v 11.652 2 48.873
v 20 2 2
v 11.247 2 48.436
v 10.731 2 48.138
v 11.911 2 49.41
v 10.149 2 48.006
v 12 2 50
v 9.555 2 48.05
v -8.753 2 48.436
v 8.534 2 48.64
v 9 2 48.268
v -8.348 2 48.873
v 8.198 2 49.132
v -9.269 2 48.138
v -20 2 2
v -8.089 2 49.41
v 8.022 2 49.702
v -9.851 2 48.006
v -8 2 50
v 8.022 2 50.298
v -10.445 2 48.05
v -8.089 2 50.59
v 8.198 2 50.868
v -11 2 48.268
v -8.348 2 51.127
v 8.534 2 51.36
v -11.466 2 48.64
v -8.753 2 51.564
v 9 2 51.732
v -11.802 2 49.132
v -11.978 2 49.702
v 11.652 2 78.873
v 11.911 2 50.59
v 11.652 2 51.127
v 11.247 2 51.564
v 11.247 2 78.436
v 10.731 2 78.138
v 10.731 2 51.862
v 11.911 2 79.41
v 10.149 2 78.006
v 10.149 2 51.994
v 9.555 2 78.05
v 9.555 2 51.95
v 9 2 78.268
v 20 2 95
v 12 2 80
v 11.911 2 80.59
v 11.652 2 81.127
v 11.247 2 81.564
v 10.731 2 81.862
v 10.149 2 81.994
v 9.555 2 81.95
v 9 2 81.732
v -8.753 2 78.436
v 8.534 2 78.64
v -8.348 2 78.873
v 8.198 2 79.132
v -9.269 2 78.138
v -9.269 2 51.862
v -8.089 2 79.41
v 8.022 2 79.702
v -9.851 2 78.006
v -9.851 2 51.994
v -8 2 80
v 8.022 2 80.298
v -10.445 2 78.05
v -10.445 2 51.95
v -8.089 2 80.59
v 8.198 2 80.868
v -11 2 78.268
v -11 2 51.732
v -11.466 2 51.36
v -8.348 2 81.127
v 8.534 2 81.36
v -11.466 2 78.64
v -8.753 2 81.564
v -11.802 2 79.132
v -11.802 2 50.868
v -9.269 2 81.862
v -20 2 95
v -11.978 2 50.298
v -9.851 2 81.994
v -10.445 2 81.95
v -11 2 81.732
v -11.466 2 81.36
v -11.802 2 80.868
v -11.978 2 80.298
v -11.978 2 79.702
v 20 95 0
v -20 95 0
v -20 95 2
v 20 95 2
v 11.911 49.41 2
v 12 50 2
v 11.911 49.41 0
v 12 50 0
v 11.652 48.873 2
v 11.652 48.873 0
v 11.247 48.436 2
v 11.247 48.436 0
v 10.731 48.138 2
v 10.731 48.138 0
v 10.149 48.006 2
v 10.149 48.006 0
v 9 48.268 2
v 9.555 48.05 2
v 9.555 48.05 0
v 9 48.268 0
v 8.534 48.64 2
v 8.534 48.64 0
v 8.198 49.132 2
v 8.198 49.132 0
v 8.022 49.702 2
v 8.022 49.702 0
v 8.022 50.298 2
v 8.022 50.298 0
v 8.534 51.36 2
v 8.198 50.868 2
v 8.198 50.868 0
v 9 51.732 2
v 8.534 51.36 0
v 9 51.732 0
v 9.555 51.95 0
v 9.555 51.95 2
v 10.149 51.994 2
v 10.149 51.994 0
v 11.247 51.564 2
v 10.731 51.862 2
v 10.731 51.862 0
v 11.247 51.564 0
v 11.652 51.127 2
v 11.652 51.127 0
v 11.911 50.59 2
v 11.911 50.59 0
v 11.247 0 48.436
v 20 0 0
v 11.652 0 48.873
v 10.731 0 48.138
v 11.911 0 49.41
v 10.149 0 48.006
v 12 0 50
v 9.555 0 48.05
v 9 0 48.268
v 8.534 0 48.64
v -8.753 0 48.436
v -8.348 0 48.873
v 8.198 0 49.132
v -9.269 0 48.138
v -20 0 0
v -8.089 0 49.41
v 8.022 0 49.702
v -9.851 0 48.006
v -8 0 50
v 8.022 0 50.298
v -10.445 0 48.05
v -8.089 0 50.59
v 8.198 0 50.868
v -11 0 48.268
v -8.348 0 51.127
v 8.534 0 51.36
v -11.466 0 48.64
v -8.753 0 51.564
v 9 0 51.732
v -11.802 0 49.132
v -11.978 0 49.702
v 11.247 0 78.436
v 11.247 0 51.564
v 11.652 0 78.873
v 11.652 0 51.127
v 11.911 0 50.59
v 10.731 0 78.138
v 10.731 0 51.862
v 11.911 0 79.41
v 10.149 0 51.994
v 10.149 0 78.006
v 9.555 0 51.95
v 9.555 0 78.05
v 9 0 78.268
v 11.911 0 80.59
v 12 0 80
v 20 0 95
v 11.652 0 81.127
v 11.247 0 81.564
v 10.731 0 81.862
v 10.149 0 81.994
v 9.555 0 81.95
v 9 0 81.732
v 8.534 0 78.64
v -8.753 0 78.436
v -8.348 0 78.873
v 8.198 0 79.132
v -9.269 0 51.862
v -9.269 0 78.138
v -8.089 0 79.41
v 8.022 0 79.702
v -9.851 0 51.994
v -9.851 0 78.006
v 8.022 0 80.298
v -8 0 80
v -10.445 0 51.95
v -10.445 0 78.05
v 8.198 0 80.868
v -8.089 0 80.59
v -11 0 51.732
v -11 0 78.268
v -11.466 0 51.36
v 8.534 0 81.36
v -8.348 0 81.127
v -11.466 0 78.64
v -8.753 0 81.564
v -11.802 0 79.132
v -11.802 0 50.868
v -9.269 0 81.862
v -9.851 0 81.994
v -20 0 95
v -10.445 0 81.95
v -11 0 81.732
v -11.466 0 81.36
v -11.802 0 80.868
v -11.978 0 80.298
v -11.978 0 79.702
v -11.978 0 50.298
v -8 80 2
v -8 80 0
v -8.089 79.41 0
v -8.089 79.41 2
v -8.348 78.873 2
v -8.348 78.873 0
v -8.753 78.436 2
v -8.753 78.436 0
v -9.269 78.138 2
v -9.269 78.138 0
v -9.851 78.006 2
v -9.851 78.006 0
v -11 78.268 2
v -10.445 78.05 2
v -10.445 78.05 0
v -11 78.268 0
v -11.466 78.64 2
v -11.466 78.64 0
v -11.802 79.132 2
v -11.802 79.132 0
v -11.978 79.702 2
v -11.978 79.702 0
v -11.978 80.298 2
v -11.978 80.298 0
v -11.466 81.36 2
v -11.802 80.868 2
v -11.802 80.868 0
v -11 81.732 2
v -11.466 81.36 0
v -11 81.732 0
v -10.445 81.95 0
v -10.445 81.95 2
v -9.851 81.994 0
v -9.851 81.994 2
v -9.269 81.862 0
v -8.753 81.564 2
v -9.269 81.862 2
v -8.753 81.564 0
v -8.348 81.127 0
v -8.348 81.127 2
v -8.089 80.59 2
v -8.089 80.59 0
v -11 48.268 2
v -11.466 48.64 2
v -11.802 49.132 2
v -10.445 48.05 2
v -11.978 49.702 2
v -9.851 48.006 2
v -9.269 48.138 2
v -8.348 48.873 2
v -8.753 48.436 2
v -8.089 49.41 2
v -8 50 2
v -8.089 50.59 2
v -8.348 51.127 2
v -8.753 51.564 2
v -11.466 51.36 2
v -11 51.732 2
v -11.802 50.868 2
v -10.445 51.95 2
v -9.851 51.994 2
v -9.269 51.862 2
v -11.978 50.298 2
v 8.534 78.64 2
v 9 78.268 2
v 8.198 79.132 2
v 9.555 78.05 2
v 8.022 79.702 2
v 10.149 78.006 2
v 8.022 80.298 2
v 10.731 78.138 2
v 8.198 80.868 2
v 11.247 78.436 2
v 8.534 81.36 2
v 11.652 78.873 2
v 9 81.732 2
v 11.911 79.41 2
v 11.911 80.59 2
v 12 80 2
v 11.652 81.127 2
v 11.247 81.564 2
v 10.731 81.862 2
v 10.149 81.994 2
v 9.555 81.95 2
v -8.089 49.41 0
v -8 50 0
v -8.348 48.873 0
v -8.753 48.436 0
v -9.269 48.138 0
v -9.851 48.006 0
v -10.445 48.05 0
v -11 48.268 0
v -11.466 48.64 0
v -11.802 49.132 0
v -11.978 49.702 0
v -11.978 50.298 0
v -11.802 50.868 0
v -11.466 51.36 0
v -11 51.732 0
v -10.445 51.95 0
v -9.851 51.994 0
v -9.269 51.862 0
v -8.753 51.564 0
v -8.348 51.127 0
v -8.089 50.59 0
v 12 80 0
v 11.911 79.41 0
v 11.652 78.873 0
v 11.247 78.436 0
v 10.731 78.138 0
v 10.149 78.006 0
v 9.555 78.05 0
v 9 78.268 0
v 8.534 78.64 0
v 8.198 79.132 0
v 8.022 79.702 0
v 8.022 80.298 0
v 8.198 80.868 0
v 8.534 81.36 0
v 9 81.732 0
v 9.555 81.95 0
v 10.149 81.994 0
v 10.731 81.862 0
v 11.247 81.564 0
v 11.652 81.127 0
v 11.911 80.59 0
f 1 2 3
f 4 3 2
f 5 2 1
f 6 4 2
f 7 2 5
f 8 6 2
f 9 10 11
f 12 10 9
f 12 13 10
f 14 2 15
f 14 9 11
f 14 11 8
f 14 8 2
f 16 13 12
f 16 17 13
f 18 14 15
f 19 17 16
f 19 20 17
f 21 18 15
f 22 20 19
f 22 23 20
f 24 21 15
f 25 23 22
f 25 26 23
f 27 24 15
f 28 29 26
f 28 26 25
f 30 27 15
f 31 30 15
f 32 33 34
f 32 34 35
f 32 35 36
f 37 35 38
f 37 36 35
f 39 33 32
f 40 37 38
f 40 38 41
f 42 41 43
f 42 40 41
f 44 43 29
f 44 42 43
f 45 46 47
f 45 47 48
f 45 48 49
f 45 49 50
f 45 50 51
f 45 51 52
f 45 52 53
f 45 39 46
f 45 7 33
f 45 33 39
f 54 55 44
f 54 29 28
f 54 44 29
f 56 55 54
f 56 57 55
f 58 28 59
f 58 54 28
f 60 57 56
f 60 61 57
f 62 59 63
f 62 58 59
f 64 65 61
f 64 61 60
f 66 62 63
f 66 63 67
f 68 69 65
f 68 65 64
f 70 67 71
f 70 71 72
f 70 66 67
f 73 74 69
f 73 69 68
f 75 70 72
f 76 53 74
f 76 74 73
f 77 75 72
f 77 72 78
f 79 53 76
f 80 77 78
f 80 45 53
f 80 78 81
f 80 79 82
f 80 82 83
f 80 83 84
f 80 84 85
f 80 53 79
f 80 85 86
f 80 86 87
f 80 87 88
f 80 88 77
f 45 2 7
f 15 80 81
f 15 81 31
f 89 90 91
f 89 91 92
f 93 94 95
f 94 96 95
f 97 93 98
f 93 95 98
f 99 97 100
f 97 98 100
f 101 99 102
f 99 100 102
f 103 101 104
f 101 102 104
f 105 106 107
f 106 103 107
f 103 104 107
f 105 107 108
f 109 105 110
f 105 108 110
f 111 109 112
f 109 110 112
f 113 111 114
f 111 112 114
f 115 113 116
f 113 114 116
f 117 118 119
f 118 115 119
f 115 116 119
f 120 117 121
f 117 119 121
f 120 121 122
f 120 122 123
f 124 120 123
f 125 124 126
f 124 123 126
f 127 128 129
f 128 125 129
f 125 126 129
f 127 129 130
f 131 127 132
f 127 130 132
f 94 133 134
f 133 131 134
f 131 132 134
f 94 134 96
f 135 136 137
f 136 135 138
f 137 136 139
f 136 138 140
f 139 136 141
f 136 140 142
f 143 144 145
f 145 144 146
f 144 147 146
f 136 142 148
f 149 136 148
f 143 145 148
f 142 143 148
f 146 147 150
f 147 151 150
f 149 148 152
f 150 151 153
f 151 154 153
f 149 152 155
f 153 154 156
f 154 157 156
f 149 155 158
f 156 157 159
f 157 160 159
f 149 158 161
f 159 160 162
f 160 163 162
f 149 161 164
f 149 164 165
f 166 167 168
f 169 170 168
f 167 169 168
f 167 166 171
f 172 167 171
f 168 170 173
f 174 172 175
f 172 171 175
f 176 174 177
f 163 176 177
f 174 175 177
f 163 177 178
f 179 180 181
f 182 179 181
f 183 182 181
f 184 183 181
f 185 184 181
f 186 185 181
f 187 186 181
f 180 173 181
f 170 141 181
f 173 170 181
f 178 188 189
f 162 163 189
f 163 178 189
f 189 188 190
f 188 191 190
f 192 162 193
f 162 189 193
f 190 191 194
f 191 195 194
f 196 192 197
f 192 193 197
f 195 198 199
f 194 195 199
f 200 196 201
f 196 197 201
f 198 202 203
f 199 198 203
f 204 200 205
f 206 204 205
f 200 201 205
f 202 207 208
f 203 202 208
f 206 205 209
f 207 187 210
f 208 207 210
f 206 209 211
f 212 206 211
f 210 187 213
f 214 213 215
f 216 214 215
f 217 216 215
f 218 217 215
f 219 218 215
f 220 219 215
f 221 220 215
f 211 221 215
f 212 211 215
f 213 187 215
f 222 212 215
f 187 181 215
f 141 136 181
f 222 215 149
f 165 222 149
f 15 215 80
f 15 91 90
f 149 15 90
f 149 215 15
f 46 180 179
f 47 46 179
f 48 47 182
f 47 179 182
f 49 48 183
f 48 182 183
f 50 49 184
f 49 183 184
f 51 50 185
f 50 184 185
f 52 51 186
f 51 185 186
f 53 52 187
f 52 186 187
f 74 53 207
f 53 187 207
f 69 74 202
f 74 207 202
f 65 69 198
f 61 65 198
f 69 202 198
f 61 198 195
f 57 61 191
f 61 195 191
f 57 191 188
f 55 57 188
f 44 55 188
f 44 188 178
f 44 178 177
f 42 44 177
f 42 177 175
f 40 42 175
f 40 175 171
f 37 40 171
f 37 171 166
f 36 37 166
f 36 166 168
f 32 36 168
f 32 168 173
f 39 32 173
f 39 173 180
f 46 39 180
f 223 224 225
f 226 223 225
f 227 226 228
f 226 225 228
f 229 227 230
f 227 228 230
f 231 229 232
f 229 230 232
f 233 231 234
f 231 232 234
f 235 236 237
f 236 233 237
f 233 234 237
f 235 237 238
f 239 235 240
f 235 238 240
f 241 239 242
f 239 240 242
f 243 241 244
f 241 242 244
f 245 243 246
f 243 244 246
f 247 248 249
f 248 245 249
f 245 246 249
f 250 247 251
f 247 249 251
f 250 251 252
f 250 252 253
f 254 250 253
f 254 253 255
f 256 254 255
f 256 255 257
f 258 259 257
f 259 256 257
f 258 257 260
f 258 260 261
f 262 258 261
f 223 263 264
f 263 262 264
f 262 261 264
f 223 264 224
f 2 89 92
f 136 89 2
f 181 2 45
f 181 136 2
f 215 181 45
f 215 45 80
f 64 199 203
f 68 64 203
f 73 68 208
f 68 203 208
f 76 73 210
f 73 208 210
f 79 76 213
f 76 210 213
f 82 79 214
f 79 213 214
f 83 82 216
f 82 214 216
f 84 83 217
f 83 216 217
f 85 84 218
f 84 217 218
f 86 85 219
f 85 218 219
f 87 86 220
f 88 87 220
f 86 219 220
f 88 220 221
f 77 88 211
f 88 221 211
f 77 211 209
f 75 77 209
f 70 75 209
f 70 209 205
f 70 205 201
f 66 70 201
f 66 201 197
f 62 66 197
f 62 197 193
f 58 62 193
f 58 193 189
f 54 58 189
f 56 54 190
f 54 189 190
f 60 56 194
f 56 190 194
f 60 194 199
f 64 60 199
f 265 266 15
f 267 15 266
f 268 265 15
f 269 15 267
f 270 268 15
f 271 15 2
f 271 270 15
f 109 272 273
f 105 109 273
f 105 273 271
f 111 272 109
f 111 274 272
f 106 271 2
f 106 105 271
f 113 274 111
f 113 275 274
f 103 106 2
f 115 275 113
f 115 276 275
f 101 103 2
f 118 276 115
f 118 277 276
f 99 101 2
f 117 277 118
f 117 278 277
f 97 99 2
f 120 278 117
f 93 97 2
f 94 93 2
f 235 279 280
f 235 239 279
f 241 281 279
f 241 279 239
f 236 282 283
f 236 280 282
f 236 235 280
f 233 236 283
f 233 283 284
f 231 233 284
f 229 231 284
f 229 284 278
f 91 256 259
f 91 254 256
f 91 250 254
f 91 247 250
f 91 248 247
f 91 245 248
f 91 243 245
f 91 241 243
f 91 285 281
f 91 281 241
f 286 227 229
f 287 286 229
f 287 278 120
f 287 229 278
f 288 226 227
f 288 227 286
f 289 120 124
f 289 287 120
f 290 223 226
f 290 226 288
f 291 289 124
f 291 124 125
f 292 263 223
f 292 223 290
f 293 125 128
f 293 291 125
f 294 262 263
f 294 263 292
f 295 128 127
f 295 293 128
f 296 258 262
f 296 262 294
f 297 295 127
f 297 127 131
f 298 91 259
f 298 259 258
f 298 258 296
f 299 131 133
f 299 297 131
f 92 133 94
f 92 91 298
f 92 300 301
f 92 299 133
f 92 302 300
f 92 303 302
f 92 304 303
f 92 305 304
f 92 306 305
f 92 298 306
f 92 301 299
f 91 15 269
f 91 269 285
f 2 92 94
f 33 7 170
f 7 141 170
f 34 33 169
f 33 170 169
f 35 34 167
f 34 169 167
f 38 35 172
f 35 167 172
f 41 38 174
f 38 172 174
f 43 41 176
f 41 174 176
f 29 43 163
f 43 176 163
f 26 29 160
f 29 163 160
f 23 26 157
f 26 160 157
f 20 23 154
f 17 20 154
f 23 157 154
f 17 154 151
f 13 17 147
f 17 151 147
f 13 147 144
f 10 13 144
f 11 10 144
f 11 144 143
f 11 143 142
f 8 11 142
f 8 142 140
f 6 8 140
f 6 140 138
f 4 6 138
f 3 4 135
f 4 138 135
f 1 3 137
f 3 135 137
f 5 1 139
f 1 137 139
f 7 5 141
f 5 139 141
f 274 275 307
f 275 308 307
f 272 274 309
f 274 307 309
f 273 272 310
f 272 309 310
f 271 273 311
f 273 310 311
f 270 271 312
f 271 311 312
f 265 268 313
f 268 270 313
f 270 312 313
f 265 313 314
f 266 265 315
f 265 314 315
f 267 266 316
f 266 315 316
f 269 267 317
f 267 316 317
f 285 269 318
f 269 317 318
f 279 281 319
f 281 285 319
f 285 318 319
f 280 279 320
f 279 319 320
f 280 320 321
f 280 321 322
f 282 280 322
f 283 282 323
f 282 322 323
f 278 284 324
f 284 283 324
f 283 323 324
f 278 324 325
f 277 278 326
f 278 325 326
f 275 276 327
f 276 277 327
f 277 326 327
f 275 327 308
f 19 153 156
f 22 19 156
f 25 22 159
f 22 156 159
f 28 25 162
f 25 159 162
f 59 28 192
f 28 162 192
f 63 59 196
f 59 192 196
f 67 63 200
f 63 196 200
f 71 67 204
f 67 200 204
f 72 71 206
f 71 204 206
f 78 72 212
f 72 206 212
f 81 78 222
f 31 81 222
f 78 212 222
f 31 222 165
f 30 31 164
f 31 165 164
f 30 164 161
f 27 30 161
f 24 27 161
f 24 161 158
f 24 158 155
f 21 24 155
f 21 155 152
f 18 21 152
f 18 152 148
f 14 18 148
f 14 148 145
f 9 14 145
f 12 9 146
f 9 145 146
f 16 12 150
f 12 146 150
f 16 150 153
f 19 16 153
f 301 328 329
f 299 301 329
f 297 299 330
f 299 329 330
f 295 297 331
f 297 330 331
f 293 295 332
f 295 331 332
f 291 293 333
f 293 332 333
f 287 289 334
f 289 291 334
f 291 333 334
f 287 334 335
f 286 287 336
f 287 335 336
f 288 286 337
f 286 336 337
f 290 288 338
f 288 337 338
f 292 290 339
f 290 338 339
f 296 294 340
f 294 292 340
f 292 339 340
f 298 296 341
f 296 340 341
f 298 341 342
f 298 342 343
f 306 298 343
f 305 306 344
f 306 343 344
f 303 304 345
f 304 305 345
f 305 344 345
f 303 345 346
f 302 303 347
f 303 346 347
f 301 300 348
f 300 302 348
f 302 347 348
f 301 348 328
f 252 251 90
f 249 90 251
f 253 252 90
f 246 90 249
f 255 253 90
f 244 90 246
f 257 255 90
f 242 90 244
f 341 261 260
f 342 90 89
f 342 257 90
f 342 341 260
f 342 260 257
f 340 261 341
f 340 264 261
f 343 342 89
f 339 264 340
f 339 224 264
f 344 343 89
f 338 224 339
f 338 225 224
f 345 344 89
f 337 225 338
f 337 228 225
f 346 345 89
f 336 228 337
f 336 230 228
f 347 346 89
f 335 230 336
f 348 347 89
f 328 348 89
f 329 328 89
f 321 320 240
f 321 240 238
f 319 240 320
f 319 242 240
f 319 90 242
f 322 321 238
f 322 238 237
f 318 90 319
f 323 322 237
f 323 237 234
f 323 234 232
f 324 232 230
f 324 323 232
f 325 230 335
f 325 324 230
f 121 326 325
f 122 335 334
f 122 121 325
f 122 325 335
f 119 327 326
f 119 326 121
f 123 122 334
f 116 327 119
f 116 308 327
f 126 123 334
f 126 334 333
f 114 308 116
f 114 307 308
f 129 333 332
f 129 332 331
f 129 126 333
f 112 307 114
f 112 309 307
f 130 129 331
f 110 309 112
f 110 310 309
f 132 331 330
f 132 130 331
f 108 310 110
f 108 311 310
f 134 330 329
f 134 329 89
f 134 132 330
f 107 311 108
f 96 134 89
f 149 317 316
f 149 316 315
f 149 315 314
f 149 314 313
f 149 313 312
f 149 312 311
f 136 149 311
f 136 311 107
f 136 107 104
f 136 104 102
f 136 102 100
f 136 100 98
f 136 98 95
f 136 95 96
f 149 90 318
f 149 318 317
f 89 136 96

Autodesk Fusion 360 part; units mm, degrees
sketch "Sketch1" plane through (0, 0, 0) normal (0, 0, 1) x (1, 0, 0)
  line L0 (-20, 95) -> (20, 95)
  line L1 (20, 95) -> (20, 0)
  line L2 (20, 0) -> (-20, 0)
  line L3 (-20, 0) -> (-20, 95)
  circle A0 centre (-10, 80) radius 2
  circle A1 centre (10, 80) radius 2
  circle A2 centre (-10, 50) radius 2
  circle A3 centre (10, 50) radius 2
  line L4 (0, 125) -> (0, -25) construction
  dimension "d1" = 95
  dimension "d2" = 40
  dimension "d3" = 4
  dimension "d8" = 20
  dimension "d9" = -30
  dimension "d10" = 15
extrude "Extrude1" add sketch "Sketch1" along normal blind 2 makes body 1
ref_plane "WorkPlane1" through (0, 0, 0) normal (0, 0.7071, -0.7071) x (-1, 0, 0)
mirror "Mirror1" about plane through (0, 0, 0) normal (0, 0.7071, -0.7071) of "Extrude1" makes body 2
combine "Combine1" operation add target body 2 tool bodies 1
